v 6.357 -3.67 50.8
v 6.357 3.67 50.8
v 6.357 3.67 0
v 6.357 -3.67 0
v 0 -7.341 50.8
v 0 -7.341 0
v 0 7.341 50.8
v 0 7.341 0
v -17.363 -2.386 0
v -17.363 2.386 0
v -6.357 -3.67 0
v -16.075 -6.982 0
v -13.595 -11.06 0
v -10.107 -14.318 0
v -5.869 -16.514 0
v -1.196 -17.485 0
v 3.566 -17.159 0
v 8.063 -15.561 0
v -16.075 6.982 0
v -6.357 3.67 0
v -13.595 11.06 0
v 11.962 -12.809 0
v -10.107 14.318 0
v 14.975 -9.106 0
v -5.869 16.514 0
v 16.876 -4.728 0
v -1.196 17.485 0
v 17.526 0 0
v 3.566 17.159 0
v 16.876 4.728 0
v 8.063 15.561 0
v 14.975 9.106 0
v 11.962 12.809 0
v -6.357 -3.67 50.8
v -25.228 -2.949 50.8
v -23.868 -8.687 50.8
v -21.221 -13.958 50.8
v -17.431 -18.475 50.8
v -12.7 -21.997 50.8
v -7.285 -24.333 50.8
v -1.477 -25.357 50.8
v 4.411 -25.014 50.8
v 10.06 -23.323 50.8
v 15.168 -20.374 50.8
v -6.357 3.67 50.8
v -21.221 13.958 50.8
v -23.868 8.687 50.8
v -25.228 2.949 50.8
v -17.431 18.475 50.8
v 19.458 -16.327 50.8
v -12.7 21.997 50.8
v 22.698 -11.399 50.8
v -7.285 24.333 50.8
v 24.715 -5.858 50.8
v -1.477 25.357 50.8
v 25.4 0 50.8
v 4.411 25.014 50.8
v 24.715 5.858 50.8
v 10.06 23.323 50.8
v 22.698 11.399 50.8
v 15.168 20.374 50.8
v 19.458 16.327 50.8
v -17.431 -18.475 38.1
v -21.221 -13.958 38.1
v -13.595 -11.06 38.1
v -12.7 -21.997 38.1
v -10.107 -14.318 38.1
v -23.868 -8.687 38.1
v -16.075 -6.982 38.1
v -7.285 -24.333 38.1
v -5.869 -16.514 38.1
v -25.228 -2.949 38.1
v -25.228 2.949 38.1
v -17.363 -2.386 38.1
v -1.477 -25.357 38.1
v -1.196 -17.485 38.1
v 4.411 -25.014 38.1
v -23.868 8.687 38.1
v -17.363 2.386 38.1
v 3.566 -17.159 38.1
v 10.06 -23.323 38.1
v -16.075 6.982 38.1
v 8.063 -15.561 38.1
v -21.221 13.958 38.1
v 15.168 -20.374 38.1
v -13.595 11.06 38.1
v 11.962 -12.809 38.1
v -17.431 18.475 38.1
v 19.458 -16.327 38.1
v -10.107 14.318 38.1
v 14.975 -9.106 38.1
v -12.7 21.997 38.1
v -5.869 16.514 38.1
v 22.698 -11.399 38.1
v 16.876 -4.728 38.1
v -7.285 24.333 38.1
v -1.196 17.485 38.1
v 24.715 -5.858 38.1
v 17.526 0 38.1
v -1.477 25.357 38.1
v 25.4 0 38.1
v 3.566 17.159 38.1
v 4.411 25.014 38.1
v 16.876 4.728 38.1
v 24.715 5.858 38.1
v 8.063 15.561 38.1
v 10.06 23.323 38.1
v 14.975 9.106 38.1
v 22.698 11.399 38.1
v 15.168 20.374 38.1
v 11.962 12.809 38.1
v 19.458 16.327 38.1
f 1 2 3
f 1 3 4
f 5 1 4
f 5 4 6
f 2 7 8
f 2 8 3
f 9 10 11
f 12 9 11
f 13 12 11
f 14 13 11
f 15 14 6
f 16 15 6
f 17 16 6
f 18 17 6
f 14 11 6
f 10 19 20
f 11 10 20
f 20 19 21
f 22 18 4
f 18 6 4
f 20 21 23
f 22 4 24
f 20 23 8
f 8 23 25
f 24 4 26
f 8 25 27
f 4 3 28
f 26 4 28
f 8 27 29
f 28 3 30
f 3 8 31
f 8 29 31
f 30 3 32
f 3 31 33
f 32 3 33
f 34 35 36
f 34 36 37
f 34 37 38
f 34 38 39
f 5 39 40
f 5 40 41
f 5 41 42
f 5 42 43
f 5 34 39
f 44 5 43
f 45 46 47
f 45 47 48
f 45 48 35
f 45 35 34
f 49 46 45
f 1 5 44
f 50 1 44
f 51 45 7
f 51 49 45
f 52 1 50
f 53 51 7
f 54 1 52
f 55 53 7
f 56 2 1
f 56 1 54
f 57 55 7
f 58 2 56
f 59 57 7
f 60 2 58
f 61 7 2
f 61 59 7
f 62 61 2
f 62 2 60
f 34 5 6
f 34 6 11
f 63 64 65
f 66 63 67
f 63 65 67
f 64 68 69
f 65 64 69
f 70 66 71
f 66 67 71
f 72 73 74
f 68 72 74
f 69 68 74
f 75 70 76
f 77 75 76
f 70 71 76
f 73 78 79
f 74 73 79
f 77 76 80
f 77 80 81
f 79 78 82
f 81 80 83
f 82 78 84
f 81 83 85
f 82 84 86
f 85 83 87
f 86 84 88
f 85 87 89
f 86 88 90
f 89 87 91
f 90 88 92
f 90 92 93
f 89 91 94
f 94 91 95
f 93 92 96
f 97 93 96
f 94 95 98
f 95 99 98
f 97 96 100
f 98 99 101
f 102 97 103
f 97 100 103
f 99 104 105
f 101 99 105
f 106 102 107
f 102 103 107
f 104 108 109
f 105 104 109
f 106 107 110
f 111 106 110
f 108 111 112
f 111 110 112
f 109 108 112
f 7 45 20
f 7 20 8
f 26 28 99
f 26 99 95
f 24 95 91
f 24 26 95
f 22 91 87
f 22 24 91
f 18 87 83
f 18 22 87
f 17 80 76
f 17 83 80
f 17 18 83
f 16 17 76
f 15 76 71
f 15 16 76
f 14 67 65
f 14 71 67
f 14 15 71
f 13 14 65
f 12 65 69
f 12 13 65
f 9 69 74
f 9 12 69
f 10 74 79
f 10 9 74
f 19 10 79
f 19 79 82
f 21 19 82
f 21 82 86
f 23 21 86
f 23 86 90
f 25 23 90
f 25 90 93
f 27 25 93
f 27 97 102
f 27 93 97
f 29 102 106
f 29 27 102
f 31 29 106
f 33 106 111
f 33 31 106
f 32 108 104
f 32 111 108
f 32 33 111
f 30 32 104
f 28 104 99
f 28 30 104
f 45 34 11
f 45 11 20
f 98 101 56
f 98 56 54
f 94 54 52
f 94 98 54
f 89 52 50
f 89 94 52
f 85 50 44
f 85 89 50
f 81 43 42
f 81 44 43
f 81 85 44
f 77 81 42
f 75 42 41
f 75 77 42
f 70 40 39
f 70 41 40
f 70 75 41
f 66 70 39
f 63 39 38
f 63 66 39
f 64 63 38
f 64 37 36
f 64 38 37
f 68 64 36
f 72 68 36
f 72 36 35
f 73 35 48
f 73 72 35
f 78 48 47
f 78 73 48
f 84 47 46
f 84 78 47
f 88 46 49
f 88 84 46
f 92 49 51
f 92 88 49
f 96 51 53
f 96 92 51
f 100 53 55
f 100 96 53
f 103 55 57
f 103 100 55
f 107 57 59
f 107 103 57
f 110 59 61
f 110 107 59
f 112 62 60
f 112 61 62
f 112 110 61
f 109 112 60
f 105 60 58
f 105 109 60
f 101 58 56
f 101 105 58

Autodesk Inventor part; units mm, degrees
ref_plane "YZ Plane" through (0, 0, 0) normal (1, 0, 0) x (0, 1, 0)
ref_plane "XZ Plane" through (0, 0, 0) normal (0, 1, 0) x (-1, 0, 0)
ref_plane "XY Plane" through (0, 0, 0) normal (0, 0, 1) x (1, 0, 0)
sketch "Sketch1" plane through (0, 0, 0) normal (0, 0, 1) x (1, 0, 0)
  circle A0 centre (0, 0) radius 17.526
  dimension "d0" = 35.052
extrude "Extrusion1" add sketch "Sketch1" along normal blind 38.1
sketch "Sketch2" plane through (0, 0, 38.1) normal (0, 0, 1) x (1, 0, 0)
  circle A0 centre (0, 0) radius 25.4
  dimension "d3" = 50.8
extrude "Extrusion2" add sketch "Sketch2" along normal blind 12.7
sketch "Sketch3" plane through (0, 0, 50.8) normal (0, 0, 1) x (1, 0, 0)
  line L0 (0, -7.3406) -> (-6.3571, -3.6703)
  line L1 (-6.3571, -3.6703) -> (-6.3571, 3.6703)
  line L2 (-6.3571, 3.6703) -> (0, 7.3406)
  line L3 (0, 7.3406) -> (6.3571, 3.6703)
  line L4 (6.3571, 3.6703) -> (6.3571, -3.6703)
  line L5 (6.3571, -3.6703) -> (0, -7.3406)
  point P0 (0, 0)
  point P1 (0, 0)
  dimension "d7" = 14.6812
extrude "Extrusion3" cut sketch "Sketch3" against normal through all
properties part number "Hex Adapter" material "PC/ABS Plastic"
